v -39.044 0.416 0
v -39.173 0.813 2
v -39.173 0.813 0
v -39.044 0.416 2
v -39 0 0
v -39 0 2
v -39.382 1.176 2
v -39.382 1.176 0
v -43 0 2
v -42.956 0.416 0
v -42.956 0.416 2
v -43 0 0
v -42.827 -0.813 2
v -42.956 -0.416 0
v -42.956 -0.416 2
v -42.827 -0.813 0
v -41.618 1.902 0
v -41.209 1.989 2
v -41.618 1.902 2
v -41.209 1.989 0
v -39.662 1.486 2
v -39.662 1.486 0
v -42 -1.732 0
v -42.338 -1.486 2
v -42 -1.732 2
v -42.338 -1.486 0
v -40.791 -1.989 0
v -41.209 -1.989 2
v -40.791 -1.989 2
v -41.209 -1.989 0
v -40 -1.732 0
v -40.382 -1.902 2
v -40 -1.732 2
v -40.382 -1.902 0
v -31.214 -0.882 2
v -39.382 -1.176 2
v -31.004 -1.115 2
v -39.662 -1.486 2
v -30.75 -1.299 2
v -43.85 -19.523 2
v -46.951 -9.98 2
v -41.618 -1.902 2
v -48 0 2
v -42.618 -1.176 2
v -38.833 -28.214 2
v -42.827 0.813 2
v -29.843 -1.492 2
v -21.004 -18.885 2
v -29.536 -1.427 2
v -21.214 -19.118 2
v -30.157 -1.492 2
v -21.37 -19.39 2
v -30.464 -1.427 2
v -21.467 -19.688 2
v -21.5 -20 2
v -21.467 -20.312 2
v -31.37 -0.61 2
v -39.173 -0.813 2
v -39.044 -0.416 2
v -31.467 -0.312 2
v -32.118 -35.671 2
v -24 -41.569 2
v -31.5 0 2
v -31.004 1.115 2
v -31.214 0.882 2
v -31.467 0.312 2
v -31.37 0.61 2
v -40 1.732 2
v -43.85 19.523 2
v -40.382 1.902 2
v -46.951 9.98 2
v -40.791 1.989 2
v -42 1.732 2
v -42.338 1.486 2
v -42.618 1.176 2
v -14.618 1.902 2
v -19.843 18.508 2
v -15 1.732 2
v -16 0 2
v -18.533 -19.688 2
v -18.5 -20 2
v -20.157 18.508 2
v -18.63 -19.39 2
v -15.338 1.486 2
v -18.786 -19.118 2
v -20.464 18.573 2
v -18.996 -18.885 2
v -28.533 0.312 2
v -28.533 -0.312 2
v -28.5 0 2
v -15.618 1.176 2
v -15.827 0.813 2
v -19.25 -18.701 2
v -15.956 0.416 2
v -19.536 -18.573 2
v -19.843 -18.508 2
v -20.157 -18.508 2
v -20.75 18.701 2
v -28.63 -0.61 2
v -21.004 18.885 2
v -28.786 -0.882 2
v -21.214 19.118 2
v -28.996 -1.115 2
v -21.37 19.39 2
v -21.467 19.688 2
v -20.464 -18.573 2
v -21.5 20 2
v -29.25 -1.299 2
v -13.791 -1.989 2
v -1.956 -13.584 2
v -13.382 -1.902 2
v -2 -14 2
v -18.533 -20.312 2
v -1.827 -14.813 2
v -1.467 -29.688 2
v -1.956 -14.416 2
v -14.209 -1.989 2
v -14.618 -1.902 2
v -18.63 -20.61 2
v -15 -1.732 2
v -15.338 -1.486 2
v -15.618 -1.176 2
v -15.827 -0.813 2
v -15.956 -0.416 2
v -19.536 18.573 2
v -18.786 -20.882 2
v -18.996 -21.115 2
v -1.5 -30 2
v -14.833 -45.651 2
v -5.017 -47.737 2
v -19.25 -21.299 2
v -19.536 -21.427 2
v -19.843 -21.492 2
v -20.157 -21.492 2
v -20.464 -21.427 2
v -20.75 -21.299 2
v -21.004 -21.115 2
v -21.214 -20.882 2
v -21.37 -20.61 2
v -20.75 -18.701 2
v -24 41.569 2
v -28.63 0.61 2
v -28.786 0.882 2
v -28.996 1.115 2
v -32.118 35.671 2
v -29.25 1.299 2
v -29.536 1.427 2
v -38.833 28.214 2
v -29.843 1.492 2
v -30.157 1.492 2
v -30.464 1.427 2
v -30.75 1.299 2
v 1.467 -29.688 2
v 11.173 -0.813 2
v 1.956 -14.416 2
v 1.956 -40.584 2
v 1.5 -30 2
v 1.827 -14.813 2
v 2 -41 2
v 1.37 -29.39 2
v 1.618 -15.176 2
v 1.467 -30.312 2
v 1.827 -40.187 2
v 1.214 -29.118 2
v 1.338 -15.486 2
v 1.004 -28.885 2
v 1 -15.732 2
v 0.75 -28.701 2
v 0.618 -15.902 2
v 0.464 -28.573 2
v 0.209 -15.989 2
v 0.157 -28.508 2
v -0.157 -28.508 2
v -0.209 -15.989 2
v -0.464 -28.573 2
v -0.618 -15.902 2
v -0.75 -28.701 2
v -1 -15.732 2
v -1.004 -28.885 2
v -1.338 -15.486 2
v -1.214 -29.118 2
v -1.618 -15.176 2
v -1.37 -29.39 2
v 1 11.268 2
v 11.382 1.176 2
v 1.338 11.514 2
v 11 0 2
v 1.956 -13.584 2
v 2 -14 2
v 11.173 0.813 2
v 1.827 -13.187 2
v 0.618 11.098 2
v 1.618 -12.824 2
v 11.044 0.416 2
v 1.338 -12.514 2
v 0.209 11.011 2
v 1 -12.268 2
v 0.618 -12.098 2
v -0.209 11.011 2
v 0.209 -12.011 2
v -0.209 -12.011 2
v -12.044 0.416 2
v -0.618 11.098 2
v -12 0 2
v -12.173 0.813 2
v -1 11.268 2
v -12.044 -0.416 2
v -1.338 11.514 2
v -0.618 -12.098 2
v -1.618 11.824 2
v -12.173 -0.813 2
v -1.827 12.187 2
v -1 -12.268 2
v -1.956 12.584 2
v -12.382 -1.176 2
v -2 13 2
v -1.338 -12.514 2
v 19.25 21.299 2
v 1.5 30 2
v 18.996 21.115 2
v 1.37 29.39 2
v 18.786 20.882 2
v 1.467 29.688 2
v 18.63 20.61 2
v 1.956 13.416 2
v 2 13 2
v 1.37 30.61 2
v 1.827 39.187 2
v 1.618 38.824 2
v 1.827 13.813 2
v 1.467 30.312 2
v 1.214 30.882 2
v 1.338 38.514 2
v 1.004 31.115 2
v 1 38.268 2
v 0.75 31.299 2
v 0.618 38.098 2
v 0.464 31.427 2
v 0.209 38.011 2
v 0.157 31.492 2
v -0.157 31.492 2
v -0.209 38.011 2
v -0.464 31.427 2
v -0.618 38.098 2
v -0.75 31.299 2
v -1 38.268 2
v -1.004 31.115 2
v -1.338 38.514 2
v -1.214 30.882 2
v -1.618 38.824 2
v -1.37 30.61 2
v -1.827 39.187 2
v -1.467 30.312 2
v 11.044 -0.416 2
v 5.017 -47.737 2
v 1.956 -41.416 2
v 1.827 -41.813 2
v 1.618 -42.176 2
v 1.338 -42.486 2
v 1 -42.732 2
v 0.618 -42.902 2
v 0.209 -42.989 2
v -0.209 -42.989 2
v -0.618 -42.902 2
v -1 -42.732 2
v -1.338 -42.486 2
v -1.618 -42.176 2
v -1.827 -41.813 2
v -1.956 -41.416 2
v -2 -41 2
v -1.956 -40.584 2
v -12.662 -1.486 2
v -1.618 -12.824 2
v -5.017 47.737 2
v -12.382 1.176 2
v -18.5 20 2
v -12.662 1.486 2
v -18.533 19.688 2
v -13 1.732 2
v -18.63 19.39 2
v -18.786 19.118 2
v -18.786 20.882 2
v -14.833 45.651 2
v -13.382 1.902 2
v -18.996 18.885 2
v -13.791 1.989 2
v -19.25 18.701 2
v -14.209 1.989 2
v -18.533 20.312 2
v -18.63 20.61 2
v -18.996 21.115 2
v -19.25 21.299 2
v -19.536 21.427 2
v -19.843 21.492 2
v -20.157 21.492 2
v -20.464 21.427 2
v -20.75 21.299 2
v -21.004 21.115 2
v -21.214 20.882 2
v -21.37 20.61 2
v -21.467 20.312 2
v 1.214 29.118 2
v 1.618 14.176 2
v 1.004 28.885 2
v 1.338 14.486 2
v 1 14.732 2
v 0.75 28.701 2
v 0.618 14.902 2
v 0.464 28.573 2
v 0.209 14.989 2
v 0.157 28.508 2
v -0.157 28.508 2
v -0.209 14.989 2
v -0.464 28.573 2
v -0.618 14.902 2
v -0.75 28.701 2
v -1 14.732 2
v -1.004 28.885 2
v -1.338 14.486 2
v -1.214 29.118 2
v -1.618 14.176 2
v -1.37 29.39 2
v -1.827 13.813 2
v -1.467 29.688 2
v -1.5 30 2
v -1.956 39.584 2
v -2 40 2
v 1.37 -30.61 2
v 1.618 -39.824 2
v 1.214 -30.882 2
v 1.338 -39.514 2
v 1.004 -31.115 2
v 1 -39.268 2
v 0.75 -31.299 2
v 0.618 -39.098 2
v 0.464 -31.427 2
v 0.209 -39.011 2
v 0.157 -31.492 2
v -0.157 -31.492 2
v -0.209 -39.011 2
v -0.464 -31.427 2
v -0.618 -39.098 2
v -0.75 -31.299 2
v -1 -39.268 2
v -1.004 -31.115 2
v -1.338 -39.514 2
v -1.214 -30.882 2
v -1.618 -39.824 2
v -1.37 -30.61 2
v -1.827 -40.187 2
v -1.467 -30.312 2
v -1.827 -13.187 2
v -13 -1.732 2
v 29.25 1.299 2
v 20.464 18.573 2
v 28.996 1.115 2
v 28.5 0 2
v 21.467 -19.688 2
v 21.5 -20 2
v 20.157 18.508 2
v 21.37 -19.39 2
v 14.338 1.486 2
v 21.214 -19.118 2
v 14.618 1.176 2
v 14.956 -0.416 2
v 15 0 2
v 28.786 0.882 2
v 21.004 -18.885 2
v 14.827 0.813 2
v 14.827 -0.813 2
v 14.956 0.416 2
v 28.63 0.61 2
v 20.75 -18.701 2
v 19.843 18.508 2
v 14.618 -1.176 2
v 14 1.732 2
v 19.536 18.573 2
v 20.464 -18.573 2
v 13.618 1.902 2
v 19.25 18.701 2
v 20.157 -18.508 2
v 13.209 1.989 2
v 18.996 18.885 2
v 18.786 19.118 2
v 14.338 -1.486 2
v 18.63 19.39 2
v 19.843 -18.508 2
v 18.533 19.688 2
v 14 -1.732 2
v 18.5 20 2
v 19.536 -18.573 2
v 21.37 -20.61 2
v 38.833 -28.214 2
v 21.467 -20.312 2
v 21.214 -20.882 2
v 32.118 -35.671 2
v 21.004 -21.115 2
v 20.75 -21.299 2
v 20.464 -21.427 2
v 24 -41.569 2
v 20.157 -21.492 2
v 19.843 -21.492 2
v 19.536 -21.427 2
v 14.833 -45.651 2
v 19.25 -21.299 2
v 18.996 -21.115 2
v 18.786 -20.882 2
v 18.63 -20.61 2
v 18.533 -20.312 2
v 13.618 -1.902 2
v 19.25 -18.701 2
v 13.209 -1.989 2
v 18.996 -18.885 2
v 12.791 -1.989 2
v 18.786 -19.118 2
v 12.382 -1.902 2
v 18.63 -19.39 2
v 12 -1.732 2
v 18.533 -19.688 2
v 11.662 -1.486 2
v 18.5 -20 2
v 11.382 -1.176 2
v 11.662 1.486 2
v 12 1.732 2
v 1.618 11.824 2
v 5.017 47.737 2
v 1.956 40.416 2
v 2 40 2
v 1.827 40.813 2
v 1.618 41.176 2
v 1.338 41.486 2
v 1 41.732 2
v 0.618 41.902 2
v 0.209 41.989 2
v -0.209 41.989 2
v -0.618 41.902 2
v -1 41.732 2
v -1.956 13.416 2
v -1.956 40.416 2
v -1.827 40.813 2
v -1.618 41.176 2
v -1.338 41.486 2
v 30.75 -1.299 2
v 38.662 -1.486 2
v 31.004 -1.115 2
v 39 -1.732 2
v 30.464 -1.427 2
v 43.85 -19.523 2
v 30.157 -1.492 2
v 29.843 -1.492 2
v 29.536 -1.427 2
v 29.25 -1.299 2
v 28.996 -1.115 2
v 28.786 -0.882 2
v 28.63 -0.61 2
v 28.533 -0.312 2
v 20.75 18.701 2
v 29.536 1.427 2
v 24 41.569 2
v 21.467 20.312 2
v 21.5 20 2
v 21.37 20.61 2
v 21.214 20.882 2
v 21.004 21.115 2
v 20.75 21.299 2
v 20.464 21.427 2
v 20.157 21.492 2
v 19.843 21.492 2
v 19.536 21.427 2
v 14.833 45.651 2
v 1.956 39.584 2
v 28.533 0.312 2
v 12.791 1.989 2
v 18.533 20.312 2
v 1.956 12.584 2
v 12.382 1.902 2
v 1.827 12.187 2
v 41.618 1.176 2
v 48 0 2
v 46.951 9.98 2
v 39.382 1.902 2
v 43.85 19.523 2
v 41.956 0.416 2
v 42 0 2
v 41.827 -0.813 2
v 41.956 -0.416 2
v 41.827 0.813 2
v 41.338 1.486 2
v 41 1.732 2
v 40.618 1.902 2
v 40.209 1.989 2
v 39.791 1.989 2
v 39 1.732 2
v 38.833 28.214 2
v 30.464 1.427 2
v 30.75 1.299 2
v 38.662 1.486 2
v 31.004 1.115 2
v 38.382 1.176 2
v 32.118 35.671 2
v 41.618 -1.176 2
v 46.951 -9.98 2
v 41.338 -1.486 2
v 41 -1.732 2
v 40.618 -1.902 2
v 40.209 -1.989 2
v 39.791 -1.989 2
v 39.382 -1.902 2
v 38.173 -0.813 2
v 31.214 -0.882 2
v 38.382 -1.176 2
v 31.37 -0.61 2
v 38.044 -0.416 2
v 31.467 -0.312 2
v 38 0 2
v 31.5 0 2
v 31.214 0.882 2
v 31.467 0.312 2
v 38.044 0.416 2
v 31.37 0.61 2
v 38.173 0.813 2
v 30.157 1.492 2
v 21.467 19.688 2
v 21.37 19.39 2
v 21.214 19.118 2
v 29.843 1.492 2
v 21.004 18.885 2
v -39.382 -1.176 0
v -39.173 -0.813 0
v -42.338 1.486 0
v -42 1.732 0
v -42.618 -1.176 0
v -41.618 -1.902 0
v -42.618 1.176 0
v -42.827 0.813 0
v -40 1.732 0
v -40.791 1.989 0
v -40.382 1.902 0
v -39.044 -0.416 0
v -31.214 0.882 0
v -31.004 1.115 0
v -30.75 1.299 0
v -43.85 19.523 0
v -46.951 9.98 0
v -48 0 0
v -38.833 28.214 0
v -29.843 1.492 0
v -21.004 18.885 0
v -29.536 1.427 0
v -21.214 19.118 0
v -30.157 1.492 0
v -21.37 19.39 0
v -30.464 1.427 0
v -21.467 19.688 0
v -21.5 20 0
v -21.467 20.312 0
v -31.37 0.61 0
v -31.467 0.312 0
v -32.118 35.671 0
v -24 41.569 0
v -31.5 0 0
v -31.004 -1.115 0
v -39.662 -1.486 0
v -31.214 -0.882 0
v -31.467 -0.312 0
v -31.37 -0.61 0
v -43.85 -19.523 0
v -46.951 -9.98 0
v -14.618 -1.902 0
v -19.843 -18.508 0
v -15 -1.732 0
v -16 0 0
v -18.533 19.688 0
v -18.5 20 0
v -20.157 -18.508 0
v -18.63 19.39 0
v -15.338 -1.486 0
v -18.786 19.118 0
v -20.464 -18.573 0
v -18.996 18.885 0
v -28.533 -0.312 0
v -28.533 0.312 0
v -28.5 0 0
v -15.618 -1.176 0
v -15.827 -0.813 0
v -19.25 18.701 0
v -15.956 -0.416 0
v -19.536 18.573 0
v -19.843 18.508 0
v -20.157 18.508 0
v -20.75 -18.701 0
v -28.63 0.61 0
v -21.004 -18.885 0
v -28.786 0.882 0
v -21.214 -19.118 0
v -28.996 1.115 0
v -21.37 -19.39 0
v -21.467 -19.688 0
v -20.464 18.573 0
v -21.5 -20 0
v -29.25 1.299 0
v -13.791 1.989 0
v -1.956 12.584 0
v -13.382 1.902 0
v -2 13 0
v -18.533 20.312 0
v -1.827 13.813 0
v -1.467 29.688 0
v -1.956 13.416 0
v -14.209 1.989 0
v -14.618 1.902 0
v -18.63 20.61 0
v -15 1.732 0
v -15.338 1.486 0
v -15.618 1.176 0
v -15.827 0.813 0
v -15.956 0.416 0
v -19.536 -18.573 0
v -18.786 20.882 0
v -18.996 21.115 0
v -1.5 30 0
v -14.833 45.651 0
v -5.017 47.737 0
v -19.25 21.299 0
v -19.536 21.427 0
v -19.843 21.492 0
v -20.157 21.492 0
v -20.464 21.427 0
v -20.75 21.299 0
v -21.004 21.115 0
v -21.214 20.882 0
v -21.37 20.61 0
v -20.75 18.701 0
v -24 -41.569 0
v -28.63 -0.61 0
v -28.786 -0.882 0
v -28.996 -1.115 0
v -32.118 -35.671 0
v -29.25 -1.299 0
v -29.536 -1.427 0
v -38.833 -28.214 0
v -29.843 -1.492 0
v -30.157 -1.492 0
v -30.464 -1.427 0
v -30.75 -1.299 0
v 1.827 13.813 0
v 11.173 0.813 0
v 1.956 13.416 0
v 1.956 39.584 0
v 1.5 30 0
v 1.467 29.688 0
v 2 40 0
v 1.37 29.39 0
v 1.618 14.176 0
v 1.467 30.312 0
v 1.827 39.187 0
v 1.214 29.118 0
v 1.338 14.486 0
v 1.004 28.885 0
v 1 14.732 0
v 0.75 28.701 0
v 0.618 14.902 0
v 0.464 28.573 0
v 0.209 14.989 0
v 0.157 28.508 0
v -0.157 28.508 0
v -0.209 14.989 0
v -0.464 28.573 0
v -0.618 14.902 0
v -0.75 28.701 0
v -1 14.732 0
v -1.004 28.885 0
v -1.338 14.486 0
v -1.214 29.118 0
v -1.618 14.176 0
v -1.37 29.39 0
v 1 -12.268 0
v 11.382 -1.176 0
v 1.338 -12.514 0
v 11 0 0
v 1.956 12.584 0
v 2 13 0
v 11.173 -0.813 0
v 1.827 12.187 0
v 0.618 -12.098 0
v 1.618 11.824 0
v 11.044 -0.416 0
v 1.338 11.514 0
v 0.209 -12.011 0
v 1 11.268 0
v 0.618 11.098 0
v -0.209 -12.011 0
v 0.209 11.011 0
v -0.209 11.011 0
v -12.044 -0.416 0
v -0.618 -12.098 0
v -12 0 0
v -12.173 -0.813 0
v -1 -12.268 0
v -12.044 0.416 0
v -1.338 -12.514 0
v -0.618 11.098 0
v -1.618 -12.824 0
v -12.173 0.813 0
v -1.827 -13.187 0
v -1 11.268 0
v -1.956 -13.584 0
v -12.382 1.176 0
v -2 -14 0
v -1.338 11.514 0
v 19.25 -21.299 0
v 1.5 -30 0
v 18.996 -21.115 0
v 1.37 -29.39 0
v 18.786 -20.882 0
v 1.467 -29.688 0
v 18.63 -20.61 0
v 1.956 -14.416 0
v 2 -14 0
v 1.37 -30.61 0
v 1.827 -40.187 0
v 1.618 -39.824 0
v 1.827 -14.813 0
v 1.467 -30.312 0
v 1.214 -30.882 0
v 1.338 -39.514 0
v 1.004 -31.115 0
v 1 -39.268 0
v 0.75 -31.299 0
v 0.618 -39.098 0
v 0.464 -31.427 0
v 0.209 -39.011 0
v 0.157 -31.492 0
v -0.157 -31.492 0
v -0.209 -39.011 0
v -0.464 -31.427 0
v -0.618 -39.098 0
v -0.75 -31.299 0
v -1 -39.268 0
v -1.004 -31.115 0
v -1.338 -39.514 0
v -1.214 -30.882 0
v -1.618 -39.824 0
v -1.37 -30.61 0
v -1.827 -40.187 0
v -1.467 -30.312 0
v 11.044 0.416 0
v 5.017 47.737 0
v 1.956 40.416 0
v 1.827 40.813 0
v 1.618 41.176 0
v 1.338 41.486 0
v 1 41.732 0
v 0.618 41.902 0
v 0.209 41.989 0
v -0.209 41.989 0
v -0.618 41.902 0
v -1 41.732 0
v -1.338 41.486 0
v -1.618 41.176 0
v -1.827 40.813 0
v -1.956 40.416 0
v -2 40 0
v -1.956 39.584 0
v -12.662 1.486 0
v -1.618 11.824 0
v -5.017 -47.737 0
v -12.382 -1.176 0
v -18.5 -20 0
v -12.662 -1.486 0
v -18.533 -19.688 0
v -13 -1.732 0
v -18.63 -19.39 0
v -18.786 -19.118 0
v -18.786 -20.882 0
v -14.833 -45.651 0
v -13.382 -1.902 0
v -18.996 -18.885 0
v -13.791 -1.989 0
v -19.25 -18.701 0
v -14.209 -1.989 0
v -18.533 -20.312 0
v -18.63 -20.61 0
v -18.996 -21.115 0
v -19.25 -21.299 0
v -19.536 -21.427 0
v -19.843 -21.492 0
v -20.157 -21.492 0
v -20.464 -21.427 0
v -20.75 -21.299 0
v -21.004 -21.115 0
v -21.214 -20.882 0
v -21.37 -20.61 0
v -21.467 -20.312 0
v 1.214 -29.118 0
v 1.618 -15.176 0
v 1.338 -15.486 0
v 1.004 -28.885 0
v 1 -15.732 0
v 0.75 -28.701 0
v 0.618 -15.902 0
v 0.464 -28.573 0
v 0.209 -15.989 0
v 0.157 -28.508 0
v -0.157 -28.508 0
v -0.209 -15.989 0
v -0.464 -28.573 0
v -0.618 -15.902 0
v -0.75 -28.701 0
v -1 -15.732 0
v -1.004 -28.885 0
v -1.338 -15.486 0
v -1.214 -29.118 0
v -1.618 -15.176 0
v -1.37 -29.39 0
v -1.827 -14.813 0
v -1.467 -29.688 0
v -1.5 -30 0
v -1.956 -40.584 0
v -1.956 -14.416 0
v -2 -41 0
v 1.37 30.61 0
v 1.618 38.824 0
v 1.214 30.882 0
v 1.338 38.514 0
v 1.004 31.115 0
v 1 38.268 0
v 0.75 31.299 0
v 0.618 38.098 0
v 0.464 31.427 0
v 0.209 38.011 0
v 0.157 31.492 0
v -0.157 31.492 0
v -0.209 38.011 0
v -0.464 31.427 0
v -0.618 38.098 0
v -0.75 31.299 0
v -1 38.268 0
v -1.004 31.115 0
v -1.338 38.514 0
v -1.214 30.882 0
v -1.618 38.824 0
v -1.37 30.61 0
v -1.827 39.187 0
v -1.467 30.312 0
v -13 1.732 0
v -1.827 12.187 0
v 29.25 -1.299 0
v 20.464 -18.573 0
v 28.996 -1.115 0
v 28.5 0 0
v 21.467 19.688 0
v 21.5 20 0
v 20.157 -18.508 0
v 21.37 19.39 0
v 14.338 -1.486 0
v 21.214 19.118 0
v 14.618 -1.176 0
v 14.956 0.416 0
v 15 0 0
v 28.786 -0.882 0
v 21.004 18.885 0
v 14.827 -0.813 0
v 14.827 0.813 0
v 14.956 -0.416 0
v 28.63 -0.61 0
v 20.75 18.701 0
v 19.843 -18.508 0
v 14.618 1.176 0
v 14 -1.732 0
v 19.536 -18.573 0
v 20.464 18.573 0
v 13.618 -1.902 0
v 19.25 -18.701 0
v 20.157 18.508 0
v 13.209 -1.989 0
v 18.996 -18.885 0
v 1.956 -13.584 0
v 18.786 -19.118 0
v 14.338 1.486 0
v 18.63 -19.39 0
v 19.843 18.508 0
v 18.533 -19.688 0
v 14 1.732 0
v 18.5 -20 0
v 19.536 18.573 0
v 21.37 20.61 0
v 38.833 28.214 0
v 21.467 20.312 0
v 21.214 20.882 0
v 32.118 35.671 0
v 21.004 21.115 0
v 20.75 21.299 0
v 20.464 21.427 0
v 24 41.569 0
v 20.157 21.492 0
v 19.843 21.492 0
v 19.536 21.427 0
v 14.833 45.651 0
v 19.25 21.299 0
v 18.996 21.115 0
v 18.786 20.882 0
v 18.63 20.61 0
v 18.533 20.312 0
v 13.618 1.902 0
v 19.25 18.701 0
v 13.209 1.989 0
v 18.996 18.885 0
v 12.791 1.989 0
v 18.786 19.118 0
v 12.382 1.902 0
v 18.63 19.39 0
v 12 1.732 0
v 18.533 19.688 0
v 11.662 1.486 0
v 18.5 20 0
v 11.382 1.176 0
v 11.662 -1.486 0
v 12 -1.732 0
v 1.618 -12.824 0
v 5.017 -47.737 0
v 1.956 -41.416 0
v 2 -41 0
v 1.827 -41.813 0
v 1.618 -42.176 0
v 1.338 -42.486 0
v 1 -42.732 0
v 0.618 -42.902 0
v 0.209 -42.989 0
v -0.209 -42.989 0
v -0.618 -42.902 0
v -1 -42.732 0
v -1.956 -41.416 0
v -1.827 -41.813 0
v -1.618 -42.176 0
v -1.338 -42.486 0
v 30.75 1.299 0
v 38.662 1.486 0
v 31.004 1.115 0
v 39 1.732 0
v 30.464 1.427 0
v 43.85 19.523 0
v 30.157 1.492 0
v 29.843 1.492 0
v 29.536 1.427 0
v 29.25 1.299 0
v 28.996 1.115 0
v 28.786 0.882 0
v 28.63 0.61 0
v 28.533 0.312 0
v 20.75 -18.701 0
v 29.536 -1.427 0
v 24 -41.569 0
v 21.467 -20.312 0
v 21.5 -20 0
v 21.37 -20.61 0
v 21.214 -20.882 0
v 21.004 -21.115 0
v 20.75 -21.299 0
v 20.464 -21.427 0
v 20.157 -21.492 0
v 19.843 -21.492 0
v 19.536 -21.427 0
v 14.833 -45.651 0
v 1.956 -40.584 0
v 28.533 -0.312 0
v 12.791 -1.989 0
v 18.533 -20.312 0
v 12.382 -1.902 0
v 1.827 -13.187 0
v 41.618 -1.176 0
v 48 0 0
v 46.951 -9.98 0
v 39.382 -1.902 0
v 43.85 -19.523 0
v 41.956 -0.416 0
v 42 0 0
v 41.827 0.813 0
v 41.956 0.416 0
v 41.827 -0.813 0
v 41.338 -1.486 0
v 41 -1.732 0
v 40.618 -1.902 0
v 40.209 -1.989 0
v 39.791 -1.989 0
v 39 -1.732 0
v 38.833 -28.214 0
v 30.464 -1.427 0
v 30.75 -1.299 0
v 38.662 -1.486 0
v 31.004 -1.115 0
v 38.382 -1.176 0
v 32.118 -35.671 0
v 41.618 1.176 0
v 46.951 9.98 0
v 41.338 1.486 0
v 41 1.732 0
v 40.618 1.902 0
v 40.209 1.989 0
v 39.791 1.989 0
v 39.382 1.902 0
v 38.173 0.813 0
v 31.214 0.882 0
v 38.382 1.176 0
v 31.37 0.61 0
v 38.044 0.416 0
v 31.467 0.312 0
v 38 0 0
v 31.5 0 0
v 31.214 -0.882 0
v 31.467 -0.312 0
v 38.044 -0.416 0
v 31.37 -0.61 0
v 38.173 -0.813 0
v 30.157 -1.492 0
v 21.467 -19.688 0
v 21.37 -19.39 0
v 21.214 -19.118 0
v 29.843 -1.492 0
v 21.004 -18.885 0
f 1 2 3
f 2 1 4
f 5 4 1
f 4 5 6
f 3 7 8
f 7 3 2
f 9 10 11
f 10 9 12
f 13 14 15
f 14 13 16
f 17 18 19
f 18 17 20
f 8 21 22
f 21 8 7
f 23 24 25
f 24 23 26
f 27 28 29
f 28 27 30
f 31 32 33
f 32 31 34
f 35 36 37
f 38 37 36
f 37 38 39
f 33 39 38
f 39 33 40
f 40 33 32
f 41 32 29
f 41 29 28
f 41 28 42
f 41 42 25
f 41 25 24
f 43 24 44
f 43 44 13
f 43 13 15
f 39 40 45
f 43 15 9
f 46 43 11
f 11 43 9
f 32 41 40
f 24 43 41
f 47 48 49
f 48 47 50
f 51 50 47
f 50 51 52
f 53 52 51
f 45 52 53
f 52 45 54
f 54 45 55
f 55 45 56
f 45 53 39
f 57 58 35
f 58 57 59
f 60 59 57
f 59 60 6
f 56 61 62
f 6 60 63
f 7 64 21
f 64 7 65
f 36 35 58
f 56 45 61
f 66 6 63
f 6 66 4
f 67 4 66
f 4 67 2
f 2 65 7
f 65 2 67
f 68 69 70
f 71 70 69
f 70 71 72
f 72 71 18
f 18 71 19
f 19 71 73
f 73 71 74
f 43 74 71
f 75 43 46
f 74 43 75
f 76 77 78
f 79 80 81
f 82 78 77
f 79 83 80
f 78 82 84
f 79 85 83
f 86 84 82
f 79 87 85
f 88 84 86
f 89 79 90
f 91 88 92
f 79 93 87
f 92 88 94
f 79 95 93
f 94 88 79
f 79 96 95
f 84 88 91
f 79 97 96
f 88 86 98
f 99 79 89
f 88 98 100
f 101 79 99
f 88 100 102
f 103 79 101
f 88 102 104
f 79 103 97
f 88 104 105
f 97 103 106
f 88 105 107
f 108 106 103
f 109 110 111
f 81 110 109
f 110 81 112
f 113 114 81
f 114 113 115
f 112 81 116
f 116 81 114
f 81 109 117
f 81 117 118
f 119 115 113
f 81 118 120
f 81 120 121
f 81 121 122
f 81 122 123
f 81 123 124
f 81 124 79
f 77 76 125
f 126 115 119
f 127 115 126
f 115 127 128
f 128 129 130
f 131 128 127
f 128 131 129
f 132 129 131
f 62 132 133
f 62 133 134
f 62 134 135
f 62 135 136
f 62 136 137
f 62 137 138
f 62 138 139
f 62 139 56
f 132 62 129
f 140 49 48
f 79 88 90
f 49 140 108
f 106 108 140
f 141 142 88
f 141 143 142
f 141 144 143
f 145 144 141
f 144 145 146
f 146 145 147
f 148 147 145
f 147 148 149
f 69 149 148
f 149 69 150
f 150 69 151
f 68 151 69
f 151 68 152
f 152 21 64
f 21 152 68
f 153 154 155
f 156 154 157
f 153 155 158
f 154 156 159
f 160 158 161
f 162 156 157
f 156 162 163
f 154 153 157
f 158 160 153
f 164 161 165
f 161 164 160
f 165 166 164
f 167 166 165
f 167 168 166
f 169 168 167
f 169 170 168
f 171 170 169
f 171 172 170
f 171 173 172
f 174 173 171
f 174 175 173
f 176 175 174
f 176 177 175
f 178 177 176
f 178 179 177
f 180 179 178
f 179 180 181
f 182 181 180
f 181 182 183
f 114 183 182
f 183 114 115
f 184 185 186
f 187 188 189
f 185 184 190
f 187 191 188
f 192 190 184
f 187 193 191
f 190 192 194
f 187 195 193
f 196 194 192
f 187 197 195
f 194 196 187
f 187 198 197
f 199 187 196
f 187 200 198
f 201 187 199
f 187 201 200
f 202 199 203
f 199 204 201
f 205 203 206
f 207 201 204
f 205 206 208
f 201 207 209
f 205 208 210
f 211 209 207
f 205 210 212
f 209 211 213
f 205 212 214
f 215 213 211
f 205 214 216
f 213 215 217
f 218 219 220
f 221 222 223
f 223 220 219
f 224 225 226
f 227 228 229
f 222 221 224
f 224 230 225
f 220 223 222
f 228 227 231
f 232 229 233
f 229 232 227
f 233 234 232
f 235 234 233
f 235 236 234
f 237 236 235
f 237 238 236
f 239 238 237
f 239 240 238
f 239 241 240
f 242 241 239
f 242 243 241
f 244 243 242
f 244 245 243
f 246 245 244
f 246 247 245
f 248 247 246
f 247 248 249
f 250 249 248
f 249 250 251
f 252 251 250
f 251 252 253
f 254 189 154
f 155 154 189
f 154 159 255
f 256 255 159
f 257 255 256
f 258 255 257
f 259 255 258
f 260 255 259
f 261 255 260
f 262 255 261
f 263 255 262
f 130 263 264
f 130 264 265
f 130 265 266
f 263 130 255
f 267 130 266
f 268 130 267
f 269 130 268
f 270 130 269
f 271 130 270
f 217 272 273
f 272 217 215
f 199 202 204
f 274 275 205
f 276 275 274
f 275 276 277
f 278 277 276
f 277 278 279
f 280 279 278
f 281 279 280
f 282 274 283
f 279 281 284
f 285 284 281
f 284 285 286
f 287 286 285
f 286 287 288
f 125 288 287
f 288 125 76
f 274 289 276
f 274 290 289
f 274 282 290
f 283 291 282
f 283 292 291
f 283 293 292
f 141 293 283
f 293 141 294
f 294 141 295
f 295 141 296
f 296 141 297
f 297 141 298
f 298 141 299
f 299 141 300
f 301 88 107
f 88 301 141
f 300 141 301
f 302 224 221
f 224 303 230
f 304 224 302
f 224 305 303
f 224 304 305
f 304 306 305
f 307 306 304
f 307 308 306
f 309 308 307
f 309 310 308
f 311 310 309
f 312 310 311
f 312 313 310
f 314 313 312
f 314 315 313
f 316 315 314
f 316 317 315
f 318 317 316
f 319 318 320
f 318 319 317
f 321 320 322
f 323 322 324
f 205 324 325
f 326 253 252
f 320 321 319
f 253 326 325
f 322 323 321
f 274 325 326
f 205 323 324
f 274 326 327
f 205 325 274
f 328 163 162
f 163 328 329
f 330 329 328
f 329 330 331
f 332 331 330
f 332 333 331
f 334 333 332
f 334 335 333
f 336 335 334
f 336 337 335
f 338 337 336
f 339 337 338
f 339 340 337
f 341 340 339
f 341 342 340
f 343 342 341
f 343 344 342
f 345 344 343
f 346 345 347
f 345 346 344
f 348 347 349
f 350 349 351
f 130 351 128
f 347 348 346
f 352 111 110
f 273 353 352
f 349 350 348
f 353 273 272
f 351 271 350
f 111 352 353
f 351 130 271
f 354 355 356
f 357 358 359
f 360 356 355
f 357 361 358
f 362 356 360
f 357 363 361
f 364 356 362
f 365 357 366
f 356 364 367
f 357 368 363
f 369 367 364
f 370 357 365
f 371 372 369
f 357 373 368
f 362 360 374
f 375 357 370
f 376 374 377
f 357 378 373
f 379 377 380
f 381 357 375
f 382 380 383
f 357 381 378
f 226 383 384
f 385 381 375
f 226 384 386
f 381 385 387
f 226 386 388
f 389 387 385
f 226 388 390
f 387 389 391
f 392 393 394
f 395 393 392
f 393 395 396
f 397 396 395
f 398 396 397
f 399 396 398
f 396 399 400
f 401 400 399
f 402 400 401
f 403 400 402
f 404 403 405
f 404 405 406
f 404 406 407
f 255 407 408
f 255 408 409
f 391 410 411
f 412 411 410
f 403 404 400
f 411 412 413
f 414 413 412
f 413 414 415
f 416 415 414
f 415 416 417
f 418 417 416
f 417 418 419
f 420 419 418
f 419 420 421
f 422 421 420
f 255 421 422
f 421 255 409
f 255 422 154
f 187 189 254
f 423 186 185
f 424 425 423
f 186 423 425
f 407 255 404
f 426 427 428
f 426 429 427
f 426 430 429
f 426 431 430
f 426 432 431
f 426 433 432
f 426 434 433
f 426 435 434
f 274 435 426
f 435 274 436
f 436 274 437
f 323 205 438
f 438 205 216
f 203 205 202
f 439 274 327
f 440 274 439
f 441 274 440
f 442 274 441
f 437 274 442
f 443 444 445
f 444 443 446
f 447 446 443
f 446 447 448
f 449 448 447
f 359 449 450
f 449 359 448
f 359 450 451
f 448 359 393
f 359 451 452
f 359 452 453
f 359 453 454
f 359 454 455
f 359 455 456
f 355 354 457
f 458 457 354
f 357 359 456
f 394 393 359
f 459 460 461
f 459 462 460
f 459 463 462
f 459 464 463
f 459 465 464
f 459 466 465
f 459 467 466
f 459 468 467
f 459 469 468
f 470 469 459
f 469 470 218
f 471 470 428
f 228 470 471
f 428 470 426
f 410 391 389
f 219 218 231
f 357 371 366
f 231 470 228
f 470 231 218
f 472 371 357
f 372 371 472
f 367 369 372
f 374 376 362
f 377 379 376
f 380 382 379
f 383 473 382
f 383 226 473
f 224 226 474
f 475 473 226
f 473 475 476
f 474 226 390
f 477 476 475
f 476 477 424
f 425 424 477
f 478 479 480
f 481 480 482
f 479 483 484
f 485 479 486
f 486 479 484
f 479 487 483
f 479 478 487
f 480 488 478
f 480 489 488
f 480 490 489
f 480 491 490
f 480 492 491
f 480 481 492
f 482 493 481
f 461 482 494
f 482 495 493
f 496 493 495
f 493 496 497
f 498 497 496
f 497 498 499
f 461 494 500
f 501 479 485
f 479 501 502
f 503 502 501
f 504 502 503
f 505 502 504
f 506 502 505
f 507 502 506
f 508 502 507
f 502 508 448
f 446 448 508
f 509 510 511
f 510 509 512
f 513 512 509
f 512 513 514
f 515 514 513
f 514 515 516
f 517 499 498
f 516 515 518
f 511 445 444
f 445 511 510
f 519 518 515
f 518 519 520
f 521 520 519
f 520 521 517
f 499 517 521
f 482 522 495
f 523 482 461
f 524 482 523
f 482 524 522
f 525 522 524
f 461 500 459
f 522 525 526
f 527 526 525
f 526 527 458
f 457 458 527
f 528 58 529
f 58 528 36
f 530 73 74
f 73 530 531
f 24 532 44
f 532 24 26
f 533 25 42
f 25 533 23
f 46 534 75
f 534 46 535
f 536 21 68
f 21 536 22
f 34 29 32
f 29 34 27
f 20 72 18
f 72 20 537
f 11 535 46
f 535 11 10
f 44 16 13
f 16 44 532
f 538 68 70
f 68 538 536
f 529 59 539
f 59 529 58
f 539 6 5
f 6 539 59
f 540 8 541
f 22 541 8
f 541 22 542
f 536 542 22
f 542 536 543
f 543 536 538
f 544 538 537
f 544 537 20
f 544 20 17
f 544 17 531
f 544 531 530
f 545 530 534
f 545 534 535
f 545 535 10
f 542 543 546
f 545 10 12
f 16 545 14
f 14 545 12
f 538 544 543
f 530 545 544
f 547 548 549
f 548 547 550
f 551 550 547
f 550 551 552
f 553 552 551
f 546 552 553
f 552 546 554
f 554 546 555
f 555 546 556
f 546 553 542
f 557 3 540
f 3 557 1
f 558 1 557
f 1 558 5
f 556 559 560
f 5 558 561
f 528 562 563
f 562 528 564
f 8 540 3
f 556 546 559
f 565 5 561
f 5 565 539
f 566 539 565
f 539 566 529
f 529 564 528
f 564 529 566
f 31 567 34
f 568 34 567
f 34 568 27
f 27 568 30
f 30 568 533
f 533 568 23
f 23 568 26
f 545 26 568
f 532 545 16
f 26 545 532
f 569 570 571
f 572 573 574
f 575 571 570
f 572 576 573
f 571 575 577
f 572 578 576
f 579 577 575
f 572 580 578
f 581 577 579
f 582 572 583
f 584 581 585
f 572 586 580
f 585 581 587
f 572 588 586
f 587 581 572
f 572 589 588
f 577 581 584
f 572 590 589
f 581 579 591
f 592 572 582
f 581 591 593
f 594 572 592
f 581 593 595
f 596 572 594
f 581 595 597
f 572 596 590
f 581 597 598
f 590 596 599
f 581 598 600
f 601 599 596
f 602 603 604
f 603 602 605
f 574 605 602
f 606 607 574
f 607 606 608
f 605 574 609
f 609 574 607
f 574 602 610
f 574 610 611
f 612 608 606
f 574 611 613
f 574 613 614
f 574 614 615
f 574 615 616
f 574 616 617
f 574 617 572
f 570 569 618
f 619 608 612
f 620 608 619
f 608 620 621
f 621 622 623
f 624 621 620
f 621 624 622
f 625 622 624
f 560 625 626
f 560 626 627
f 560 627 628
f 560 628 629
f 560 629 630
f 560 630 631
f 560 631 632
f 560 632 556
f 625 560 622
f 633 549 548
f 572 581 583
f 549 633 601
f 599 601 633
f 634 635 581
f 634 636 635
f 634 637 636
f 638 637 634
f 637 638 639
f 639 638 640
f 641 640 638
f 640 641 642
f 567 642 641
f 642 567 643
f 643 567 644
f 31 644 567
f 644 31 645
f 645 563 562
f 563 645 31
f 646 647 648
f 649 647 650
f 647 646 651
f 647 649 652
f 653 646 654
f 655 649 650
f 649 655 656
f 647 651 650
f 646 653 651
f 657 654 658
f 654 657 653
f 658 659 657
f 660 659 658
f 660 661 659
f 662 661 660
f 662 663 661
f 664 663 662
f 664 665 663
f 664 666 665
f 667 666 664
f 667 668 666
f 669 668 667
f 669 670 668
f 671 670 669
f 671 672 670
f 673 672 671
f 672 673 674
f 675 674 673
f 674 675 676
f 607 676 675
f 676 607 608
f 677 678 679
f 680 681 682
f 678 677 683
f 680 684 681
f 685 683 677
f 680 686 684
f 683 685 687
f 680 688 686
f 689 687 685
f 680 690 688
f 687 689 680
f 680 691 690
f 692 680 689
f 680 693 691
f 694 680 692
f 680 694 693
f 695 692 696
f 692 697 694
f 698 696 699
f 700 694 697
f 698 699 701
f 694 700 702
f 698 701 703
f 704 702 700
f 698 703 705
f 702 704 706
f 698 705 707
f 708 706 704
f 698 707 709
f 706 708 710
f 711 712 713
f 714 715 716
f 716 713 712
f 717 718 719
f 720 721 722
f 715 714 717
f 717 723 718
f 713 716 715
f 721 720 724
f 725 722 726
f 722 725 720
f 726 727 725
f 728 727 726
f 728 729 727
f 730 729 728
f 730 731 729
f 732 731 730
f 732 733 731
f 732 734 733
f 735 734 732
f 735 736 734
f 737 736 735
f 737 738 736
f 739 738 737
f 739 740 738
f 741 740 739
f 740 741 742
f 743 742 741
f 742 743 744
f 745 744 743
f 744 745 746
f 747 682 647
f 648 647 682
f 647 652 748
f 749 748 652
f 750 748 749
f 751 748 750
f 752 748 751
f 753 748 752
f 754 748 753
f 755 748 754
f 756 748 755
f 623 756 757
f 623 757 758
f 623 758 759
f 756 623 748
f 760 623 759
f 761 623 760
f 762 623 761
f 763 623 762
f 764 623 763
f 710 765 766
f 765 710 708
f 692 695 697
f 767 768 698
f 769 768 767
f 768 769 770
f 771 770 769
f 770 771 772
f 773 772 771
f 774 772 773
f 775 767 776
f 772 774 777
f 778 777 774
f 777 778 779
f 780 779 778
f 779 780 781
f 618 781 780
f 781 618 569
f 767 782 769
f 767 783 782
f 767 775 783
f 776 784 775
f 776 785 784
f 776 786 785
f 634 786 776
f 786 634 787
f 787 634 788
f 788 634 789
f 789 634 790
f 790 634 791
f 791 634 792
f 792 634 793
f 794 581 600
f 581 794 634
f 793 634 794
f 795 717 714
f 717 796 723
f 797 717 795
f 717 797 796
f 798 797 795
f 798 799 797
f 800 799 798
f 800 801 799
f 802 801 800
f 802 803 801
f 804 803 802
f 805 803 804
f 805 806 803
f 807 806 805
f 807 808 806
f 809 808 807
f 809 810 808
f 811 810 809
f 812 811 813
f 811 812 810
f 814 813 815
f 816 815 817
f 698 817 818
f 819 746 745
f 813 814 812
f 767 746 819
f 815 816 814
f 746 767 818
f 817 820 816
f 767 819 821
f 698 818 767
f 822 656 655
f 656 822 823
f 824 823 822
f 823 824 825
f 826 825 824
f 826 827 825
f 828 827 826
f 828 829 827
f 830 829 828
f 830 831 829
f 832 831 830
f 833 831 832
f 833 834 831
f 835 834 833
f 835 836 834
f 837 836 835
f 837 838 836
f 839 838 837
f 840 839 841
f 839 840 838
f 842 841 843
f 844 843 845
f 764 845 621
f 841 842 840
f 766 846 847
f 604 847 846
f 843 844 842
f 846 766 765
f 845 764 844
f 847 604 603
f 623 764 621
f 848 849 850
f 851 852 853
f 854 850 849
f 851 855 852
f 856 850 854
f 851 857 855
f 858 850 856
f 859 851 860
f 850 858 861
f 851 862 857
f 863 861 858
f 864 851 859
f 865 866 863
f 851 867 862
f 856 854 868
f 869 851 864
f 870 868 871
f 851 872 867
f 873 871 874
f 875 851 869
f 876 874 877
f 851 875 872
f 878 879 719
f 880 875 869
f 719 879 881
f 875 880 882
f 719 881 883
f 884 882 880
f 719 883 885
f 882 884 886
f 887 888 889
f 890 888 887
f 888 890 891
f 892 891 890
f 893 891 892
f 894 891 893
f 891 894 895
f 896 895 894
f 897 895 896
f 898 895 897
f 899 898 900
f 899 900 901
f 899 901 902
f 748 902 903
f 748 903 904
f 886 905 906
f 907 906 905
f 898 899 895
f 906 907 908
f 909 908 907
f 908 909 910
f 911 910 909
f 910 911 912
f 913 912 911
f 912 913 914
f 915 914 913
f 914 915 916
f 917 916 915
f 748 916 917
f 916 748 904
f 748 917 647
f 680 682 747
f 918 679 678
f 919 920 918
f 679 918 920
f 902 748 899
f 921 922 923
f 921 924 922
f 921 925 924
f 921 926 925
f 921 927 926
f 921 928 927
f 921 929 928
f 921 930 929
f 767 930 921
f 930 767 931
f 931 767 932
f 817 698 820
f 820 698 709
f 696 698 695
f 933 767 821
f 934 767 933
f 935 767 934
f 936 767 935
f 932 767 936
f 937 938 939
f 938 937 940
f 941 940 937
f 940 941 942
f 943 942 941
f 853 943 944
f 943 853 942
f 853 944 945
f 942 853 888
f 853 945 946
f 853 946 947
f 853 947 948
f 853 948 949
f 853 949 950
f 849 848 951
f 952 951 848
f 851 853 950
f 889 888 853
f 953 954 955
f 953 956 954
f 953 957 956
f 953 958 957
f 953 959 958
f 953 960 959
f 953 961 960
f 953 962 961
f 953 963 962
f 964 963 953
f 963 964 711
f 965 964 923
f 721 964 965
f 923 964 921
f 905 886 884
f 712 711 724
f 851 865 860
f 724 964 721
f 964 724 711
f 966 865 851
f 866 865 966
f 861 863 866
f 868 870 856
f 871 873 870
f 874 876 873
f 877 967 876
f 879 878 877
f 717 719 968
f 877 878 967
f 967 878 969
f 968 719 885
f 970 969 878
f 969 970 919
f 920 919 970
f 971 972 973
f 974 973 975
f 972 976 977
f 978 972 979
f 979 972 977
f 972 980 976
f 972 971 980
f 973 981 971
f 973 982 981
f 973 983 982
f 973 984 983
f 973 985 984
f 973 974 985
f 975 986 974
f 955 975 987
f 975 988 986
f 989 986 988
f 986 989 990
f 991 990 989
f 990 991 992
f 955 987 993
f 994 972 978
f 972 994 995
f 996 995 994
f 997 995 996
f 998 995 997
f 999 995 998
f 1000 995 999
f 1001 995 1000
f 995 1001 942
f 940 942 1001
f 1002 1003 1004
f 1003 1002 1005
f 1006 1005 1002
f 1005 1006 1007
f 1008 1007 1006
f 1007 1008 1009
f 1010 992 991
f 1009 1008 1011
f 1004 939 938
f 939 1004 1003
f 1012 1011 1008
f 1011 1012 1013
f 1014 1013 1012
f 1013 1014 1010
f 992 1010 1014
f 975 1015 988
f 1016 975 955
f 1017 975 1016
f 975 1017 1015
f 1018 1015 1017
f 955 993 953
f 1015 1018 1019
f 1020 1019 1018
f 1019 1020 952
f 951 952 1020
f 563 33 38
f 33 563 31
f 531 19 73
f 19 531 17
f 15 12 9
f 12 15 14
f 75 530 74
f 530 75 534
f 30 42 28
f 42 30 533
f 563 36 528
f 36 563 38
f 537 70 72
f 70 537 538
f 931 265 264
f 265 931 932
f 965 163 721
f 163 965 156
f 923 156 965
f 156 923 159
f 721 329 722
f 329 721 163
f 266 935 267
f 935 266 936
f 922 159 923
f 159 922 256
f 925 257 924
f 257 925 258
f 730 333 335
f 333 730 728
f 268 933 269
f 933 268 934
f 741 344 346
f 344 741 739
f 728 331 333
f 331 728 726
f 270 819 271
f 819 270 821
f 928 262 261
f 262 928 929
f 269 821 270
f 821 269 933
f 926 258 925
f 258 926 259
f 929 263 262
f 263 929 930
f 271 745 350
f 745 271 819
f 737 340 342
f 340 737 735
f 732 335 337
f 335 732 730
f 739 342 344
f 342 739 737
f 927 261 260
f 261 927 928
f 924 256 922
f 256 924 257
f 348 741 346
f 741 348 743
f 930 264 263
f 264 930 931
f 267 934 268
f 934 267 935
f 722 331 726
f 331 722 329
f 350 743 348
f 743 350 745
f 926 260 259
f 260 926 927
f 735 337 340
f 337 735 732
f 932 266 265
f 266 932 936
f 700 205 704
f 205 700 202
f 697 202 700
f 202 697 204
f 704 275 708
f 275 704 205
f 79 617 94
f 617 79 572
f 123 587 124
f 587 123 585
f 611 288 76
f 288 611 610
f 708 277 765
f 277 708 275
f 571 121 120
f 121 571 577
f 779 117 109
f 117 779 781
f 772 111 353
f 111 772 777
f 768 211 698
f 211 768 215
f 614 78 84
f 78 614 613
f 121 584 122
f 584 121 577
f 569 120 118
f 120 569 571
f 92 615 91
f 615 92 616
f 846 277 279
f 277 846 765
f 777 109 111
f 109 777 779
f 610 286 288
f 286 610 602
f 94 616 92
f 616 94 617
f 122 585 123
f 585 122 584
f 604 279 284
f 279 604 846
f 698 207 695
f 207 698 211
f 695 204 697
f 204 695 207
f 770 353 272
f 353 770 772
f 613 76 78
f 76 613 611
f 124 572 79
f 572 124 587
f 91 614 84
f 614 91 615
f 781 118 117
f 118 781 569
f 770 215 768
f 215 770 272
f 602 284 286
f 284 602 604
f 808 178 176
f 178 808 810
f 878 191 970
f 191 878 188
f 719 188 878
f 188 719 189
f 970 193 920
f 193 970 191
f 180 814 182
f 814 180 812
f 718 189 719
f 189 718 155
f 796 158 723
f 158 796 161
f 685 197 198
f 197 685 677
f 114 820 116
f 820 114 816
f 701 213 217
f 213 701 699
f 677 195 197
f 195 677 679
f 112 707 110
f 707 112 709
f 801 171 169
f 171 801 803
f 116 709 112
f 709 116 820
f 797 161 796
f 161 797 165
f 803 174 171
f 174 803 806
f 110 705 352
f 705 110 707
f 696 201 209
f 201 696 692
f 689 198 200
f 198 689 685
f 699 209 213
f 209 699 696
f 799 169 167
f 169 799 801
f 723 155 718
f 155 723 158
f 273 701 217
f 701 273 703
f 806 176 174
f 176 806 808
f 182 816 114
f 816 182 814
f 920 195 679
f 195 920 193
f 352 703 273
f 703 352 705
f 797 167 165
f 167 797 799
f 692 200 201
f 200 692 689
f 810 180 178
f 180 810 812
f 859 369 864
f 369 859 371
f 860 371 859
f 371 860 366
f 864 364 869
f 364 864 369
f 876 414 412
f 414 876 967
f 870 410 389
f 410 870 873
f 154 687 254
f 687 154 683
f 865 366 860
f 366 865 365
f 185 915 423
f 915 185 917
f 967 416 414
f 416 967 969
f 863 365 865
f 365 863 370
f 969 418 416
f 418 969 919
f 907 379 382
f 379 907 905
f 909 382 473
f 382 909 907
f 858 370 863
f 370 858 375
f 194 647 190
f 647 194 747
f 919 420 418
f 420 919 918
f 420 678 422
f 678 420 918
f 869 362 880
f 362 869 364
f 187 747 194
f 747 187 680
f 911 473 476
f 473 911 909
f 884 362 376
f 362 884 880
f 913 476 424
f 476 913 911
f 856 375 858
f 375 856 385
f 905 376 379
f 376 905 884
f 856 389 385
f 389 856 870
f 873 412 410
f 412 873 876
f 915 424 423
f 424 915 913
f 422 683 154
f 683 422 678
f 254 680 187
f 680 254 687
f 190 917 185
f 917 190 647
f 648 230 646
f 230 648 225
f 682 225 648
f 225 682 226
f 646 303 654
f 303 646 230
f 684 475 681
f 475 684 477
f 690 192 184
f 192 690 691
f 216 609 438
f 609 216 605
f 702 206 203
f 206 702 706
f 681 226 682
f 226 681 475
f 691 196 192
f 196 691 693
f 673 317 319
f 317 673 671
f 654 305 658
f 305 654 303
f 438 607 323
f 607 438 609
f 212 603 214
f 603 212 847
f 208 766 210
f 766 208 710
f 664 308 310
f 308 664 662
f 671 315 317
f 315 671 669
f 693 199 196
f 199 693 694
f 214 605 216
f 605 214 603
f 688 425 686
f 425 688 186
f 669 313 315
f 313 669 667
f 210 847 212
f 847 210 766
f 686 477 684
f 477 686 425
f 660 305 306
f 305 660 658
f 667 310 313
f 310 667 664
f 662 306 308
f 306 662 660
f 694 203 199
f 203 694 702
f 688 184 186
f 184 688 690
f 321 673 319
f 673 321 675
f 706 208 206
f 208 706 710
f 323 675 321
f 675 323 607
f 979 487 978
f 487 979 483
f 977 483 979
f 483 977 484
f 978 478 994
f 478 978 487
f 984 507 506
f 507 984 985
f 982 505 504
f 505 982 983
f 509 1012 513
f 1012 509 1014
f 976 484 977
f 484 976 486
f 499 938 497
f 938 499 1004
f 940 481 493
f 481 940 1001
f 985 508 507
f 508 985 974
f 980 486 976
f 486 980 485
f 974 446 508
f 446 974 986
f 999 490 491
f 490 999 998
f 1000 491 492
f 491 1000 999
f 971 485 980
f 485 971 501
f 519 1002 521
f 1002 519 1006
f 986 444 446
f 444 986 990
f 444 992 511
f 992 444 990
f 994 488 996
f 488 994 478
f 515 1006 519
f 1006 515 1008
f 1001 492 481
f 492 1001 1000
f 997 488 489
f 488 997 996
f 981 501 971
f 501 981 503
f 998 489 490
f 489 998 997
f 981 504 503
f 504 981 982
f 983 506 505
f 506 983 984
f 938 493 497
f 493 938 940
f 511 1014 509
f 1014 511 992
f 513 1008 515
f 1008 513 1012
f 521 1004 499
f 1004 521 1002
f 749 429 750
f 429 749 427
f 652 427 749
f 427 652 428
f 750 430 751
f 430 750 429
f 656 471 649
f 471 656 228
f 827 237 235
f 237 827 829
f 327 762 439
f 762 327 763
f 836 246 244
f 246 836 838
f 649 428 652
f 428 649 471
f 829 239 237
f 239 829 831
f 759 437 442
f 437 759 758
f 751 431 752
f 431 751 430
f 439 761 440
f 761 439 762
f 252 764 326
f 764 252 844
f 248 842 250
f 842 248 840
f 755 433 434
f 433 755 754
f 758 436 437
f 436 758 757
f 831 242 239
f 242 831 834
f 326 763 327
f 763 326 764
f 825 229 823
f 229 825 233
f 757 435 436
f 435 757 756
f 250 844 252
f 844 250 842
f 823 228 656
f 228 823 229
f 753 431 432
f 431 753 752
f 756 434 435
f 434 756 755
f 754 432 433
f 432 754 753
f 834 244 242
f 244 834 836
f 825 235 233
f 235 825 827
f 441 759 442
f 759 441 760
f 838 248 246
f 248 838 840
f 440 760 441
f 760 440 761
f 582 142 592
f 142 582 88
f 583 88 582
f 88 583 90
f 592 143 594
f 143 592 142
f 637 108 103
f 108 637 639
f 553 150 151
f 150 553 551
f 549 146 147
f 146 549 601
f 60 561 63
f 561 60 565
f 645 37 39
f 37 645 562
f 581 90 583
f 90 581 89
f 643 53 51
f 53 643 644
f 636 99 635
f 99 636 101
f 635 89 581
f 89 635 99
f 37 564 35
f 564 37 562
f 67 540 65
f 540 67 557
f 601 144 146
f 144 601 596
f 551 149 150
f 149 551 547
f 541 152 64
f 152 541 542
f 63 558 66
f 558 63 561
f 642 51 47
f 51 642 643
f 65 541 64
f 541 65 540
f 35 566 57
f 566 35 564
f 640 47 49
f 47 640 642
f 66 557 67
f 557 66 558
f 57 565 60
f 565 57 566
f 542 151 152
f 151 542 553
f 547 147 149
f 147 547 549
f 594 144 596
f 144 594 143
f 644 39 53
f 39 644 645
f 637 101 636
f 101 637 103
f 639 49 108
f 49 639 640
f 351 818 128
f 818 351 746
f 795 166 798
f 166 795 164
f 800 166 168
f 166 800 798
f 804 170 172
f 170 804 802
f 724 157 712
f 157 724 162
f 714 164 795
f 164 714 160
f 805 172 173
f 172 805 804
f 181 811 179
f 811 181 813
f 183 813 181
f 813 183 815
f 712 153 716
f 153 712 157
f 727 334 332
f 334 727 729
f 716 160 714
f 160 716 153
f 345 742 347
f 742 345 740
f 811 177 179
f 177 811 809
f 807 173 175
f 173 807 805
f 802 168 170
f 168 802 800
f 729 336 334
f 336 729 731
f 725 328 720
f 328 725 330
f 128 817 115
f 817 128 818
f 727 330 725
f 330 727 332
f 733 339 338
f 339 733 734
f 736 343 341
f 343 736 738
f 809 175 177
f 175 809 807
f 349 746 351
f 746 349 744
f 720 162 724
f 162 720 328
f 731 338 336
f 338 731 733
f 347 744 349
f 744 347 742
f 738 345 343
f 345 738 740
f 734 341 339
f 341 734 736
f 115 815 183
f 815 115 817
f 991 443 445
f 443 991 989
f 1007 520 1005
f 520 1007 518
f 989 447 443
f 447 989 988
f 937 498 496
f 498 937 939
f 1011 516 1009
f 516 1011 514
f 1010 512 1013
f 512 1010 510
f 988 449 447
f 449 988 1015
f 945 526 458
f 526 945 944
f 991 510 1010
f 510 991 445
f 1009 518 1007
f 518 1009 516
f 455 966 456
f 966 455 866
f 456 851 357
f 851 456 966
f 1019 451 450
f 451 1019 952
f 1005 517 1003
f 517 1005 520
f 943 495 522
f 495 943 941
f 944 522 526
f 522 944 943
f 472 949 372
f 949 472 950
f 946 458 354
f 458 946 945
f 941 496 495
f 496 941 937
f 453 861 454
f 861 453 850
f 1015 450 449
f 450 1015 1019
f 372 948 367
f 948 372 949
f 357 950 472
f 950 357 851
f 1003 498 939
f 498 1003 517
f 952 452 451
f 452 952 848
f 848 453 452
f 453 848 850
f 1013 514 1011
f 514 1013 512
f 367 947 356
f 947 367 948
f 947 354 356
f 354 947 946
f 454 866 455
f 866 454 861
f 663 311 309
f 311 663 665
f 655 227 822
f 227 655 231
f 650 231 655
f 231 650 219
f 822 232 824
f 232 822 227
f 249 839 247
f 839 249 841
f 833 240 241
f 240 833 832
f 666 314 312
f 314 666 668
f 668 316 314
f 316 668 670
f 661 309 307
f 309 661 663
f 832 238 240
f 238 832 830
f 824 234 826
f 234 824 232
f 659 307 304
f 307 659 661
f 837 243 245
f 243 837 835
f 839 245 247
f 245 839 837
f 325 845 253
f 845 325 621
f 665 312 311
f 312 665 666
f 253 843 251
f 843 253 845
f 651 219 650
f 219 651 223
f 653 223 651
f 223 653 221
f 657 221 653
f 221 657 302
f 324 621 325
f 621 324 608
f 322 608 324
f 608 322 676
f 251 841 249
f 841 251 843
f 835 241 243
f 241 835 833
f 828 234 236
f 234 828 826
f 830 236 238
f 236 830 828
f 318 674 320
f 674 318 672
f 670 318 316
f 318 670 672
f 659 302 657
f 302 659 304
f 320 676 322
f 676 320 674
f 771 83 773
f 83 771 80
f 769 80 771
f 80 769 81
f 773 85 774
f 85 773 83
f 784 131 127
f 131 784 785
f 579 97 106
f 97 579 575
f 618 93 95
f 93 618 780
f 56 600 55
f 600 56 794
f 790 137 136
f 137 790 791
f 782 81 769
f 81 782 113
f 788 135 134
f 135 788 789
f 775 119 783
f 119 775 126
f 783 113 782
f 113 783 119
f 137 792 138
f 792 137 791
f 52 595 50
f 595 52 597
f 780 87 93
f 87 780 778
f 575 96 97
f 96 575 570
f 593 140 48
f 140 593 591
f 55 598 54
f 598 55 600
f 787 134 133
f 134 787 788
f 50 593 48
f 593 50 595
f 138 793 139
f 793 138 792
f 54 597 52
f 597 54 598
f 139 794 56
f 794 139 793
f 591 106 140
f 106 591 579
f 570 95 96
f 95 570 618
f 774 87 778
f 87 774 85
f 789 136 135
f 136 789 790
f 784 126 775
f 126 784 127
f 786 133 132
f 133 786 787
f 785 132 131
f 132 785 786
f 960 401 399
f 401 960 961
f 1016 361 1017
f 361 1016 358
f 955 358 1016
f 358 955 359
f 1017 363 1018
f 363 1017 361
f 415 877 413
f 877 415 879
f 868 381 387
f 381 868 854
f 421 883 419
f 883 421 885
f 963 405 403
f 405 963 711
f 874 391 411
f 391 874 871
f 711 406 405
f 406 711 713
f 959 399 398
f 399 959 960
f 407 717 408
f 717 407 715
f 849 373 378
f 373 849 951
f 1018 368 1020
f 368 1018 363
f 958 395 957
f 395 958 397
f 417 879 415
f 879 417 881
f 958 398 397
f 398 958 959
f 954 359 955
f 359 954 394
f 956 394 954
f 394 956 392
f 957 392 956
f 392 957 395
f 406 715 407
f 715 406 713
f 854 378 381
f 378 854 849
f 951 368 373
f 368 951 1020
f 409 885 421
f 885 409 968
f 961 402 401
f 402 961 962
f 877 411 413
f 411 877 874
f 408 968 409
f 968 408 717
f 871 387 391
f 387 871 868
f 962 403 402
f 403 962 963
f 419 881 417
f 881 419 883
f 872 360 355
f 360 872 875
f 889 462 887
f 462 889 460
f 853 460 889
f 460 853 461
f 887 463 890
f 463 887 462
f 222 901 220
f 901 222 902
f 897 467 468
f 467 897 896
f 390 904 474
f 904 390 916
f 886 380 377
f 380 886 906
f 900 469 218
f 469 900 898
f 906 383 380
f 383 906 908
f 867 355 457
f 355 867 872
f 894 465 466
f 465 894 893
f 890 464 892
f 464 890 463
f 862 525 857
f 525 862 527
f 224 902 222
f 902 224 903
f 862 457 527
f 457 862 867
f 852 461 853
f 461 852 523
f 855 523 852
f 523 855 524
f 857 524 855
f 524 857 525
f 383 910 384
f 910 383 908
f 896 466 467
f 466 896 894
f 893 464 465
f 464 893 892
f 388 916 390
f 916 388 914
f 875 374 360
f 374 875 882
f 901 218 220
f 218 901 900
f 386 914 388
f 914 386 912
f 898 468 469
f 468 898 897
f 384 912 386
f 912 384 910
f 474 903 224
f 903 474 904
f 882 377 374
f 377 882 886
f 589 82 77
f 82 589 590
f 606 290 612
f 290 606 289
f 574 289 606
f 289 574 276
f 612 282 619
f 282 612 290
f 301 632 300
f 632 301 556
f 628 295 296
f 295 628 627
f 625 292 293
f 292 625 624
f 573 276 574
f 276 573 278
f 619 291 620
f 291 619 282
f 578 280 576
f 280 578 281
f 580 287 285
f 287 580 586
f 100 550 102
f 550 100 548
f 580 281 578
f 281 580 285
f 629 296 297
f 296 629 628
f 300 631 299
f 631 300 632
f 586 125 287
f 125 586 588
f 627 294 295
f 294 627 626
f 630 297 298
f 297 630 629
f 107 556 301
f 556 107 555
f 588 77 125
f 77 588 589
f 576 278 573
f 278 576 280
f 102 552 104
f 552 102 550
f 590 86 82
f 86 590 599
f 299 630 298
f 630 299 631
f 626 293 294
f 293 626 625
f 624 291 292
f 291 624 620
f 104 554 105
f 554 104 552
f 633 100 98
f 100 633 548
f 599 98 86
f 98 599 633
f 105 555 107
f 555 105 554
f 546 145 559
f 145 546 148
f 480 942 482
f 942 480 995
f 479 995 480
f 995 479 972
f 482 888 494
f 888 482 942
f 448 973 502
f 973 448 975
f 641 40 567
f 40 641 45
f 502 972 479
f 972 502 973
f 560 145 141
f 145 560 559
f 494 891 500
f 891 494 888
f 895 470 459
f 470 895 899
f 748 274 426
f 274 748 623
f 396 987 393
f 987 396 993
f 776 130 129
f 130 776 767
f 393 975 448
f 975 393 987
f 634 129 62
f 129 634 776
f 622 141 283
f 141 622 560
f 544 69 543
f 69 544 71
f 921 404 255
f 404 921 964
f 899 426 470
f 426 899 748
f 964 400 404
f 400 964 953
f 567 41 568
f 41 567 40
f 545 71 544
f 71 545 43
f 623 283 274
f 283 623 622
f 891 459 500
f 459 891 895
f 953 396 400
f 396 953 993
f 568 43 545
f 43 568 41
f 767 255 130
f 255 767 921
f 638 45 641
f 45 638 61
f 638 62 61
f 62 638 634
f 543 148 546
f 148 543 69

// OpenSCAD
module cubierta2(h, dg, dp, fn){
    difference(){
        cylinder (h = h, d=dg, $fn=fn);
        
        for (i =[-41: 27 :41 ]) {
            translate([i, 0, 0])
                cylinder (h = h, d=dp, $fn=fn);
            translate([0, i, 0])
                cylinder (h = h, d=dp, $fn=fn);
        }
        for (i =[-30: 60 :30 ]) {
            translate([i, 0, 0])
                cylinder (h = h, d=dp-1, $fn=fn);
            translate([0, i, 0])
                cylinder (h = h, d=dp-1, $fn=fn);
        }
        for(i =[-20: 40 :20 ]){
            translate([i, i, 0])
                cylinder (h = h, d=dp-1, $fn=fn); 
            translate([-i, i, 0])
                cylinder (h = h, d=dp-1, $fn=fn);    
        }
    }
}

cubierta2(2, 96, 4, 30);
